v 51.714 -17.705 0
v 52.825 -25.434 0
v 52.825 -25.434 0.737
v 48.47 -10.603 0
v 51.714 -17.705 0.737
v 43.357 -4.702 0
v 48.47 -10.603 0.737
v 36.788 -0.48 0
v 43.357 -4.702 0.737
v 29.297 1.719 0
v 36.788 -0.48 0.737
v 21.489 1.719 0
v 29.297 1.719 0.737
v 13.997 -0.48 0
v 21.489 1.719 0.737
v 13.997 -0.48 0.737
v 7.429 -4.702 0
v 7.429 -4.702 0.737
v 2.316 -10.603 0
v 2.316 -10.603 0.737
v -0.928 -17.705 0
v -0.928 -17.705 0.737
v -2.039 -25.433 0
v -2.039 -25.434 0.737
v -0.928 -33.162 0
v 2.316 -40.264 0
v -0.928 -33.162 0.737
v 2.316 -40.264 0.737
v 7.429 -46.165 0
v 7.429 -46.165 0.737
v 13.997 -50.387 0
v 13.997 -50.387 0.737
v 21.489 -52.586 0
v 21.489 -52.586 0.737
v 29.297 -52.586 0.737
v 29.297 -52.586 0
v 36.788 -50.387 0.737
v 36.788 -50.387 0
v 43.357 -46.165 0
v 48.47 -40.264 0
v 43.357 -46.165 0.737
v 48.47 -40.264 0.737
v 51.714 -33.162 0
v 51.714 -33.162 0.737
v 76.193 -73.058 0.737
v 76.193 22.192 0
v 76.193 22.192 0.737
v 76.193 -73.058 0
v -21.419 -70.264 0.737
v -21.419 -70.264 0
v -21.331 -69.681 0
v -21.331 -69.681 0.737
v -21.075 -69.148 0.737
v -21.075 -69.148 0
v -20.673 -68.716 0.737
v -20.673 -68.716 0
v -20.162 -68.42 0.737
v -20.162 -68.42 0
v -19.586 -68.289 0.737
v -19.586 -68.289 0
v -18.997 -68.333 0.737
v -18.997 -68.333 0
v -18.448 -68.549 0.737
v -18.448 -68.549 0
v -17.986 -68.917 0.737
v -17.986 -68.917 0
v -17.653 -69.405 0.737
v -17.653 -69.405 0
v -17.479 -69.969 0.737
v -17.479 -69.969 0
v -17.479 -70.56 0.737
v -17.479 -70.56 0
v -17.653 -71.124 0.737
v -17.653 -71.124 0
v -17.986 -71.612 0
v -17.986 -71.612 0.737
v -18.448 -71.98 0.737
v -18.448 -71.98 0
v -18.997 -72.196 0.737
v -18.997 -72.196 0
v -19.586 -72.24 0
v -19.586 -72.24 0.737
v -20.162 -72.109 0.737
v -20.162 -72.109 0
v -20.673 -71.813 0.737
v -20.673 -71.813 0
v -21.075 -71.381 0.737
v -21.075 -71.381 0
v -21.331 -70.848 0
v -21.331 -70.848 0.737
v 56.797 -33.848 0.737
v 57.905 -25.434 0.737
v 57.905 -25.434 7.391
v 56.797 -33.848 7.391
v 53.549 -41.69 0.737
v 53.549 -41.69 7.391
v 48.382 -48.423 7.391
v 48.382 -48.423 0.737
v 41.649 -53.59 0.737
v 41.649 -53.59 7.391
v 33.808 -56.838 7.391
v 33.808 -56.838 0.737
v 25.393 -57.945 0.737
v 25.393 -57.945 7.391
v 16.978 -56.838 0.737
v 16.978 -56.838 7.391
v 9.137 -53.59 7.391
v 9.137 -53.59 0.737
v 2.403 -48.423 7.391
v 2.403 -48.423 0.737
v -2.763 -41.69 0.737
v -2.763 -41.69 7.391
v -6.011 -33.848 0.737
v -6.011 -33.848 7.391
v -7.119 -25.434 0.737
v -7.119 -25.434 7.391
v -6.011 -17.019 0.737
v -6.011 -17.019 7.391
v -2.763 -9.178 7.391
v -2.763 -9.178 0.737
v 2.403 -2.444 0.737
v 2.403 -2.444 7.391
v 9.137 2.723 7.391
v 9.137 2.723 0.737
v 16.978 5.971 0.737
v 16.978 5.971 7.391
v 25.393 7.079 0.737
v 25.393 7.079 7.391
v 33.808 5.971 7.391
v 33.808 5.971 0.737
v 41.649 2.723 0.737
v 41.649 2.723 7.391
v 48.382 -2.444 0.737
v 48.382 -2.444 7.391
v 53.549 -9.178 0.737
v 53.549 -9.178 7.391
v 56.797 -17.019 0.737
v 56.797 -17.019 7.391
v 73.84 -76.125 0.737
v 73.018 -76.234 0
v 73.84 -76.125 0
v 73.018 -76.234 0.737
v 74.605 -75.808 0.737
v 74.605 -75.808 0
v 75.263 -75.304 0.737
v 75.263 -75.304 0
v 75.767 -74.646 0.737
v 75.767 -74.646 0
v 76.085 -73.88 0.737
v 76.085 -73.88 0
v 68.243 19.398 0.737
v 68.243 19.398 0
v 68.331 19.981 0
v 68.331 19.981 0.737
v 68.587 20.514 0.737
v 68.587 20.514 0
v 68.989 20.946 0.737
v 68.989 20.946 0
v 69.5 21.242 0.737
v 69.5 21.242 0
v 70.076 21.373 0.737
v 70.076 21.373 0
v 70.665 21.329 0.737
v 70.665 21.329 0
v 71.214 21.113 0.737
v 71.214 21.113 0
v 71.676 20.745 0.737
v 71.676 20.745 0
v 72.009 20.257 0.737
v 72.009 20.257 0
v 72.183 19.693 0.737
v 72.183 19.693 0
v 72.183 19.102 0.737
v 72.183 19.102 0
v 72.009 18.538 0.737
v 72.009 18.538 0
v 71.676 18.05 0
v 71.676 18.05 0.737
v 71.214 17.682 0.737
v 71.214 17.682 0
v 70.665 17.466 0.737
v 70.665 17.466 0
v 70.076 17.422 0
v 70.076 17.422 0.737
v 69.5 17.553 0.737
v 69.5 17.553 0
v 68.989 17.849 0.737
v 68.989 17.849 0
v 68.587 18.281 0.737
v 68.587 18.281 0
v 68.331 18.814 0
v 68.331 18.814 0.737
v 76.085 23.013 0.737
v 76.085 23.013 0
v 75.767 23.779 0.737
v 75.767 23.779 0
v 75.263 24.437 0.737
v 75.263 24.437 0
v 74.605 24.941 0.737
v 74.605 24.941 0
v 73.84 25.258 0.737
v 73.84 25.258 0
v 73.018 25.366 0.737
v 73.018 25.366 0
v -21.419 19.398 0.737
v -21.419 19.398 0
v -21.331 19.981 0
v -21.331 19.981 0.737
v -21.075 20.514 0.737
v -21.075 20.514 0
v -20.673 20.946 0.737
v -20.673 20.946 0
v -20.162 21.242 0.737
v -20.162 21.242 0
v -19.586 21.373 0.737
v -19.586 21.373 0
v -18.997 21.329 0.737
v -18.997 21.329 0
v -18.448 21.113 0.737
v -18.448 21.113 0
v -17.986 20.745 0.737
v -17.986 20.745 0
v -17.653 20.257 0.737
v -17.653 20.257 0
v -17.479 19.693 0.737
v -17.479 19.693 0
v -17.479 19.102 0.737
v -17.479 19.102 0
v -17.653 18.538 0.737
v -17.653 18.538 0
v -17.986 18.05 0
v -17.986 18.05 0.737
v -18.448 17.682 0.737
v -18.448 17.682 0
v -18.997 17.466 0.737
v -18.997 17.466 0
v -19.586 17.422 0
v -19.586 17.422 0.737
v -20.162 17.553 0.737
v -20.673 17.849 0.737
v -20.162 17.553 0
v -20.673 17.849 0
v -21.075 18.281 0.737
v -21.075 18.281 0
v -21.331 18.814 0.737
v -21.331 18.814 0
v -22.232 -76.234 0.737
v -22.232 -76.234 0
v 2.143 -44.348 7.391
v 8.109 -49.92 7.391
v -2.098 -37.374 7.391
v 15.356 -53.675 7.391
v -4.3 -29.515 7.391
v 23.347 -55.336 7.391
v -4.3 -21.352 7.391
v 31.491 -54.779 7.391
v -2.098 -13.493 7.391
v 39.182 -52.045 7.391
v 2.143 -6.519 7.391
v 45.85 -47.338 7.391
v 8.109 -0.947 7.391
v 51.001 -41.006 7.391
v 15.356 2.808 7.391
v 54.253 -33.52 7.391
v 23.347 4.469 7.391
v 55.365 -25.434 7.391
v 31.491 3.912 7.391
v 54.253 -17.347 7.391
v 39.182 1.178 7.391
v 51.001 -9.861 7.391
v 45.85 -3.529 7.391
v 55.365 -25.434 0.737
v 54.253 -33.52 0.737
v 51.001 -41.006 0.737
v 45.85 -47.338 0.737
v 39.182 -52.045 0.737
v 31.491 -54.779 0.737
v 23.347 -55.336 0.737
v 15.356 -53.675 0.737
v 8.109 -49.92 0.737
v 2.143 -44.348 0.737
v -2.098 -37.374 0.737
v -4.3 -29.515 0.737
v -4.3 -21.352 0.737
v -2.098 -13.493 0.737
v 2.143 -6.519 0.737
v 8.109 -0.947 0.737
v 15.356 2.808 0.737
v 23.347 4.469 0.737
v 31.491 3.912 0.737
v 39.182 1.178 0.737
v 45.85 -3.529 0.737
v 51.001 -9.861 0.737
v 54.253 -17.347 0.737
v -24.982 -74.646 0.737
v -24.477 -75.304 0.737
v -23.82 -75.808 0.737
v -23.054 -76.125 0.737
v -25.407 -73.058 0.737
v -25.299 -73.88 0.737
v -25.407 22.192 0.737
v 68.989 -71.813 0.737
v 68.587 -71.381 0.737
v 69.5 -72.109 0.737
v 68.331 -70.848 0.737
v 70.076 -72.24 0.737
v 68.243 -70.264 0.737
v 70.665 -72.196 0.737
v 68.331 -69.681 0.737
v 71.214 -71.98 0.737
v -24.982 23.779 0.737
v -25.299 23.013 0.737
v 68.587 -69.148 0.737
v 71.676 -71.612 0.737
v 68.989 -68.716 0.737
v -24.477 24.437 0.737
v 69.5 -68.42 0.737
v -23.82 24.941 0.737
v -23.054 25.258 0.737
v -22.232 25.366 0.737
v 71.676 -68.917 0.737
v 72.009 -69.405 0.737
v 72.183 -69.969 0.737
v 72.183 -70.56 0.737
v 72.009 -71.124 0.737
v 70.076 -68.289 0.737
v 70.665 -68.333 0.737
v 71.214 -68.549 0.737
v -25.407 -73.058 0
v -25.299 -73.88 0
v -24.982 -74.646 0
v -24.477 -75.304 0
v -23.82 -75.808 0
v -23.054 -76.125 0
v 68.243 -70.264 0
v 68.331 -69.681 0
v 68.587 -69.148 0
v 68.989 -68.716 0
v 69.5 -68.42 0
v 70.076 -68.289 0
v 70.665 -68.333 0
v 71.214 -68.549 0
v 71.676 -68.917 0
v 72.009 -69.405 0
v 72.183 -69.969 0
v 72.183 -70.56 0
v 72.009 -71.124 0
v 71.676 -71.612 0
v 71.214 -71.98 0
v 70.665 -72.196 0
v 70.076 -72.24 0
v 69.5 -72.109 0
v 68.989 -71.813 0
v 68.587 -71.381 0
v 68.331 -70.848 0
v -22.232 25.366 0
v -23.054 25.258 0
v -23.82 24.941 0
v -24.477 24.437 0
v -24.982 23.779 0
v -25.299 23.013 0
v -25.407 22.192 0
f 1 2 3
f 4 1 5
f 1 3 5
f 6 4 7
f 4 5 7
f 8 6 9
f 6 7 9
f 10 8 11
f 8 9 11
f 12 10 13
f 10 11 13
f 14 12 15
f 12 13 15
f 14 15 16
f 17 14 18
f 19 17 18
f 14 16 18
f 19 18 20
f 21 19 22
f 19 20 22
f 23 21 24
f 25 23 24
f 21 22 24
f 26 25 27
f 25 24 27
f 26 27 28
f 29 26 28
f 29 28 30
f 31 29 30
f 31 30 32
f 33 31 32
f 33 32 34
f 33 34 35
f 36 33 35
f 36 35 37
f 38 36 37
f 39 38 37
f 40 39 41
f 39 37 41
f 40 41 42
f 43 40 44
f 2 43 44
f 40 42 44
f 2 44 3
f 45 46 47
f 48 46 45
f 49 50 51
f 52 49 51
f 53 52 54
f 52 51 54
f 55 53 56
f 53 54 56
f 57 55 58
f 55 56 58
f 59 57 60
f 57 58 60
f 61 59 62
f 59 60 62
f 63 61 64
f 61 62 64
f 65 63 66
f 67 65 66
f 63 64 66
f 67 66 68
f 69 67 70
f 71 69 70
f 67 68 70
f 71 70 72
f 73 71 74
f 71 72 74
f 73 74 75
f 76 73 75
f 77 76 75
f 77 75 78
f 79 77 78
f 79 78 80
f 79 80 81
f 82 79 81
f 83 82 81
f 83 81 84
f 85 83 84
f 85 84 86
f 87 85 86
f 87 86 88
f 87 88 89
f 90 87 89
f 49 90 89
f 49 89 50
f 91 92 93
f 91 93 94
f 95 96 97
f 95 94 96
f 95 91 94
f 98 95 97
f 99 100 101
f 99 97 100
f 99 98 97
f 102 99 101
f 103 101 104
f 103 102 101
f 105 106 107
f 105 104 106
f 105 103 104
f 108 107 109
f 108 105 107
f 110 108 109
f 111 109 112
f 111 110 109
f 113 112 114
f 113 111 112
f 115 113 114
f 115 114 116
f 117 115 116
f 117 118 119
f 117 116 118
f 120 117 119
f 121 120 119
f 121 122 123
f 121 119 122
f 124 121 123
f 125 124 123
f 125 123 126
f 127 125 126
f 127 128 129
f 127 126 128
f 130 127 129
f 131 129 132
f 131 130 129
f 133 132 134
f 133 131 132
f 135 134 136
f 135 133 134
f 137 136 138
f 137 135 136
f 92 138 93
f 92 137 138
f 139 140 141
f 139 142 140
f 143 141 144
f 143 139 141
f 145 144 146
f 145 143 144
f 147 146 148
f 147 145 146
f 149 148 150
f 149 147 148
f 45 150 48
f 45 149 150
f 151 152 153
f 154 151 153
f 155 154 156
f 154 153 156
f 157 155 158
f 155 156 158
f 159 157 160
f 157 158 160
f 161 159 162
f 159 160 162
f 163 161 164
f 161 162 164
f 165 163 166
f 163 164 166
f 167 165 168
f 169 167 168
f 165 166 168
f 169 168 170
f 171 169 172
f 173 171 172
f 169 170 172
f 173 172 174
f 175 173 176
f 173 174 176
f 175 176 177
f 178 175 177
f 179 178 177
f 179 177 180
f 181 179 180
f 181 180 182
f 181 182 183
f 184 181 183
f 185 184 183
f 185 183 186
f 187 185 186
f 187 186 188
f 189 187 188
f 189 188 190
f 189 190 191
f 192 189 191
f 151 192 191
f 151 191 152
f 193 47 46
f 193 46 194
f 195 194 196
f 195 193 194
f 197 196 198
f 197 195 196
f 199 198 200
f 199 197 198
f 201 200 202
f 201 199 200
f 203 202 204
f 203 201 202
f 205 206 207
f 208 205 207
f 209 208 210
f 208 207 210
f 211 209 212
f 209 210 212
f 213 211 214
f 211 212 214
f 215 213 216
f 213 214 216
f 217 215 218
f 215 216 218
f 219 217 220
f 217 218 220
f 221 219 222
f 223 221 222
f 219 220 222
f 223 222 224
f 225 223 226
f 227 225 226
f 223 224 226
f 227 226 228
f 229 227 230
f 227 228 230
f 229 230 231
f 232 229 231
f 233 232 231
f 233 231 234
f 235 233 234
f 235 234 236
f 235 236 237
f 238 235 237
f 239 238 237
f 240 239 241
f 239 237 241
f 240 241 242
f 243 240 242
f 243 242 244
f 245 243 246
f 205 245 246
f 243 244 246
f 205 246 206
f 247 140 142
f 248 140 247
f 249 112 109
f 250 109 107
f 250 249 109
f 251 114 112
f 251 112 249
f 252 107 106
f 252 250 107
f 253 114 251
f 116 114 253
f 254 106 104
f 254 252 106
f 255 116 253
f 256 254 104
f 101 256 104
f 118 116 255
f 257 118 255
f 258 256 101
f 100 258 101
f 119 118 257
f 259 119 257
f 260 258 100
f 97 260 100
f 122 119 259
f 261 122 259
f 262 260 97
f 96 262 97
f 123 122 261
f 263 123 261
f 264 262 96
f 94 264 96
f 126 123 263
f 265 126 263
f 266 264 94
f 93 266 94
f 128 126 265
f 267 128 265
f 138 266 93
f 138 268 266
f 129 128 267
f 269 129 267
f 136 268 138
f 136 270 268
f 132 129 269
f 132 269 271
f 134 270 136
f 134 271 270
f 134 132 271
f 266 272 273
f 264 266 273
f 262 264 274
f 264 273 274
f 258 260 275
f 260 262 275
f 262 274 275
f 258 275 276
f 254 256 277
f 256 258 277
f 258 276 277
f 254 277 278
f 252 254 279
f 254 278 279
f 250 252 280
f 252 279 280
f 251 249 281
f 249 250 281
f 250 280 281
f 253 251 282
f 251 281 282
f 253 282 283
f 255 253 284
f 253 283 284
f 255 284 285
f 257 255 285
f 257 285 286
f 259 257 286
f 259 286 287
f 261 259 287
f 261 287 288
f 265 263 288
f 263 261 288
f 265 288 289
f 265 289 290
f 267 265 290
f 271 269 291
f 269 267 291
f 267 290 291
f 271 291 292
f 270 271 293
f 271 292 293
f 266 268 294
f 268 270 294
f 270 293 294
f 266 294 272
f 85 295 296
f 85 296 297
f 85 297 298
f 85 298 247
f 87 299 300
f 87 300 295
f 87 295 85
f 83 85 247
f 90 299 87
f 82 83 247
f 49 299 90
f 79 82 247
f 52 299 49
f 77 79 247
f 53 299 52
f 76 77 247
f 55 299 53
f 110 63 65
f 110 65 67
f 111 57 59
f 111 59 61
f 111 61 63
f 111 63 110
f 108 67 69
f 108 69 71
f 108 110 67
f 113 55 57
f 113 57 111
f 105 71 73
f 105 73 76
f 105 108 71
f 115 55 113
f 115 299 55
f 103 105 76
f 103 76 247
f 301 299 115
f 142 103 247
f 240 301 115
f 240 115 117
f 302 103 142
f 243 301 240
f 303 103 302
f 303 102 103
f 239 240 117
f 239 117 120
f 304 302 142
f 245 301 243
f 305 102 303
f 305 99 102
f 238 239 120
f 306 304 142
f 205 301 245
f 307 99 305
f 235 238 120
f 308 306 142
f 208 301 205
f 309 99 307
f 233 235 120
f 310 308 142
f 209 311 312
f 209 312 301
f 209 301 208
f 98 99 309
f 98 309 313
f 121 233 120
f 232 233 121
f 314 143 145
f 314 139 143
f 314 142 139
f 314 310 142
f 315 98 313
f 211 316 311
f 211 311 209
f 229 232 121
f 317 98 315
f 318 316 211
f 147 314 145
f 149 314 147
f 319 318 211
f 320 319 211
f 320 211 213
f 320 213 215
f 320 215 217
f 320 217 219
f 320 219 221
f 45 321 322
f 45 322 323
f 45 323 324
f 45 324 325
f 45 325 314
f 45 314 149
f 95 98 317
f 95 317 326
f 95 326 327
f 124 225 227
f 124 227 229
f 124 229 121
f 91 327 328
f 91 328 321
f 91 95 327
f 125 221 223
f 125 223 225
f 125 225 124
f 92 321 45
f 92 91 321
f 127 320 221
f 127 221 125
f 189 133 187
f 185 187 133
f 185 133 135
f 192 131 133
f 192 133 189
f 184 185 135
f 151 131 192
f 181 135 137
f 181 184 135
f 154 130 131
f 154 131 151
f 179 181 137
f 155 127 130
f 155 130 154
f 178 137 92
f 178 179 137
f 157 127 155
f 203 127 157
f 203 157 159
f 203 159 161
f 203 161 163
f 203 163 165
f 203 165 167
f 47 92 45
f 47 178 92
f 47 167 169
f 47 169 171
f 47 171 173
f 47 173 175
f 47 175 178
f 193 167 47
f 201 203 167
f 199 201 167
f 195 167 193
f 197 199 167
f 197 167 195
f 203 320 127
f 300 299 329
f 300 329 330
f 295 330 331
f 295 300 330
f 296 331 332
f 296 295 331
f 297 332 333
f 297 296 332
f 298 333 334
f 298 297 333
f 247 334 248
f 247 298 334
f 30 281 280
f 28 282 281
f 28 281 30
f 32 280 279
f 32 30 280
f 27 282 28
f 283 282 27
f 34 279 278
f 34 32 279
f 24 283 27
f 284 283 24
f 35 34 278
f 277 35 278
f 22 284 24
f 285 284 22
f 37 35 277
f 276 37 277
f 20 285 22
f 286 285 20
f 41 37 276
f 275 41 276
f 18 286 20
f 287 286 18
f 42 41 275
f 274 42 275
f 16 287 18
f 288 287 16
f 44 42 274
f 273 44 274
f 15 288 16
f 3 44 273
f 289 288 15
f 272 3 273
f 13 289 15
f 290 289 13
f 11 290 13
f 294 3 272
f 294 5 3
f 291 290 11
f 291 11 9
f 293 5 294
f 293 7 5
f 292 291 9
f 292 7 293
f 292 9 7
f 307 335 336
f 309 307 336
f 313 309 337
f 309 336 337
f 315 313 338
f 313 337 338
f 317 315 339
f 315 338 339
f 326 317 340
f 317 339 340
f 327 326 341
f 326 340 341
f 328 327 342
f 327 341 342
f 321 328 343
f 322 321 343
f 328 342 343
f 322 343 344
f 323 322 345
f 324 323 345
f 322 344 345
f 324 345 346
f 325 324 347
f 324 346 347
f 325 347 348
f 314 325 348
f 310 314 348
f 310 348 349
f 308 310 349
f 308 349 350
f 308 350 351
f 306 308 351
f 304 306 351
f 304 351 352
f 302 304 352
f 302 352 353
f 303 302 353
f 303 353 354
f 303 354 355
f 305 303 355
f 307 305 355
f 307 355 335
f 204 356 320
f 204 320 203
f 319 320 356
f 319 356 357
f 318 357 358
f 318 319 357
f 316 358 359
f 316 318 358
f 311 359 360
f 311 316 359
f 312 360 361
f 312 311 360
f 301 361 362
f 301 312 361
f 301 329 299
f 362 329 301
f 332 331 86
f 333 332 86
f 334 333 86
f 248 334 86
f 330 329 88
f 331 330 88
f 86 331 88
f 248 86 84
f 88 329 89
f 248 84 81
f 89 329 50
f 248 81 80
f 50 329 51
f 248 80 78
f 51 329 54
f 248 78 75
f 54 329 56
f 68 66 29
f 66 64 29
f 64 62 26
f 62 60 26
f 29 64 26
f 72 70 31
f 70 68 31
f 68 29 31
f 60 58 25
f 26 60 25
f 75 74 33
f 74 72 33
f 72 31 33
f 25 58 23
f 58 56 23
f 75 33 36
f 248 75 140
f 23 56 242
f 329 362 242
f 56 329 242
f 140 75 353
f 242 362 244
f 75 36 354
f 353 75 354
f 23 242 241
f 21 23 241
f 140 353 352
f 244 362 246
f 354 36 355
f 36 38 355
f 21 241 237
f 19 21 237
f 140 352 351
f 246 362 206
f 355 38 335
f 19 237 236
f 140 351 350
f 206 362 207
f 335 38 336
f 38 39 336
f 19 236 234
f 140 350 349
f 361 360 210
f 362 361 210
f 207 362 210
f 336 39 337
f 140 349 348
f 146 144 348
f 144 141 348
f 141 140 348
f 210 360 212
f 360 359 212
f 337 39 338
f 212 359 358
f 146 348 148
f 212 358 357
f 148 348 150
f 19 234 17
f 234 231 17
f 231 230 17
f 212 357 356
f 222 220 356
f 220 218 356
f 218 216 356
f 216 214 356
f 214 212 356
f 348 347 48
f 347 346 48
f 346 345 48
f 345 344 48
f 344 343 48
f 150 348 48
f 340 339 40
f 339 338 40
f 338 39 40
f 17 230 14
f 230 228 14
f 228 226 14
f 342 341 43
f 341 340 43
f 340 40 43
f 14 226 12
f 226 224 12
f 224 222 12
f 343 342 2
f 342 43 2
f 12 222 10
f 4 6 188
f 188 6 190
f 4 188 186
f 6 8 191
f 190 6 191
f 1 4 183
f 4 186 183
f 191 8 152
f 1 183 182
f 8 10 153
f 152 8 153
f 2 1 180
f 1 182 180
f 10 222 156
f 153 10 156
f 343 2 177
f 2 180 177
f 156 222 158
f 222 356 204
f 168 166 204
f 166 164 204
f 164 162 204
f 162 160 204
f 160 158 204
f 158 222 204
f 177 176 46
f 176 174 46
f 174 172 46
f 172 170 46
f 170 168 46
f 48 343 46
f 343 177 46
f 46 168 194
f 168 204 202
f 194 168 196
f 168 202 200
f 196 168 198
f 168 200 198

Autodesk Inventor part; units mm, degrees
ref_plane "YZ Plane" through (0, 0, 0) normal (1, 0, 0) x (0, 1, 0)
ref_plane "XZ Plane" through (0, 0, 0) normal (0, 1, 0) x (-1, 0, 0)
ref_plane "XY Plane" through (0, 0, 0) normal (0, 0, 1) x (1, 0, 0)
sketch "Sketch1" plane through (0, 0, 0) normal (0, 0, 1) x (1, 0, 0)
  line L0 (-25.4072, 25.3665) -> (76.1928, 25.3665)
  line L1 (76.1928, 25.3665) -> (76.1928, -76.2335)
  line L2 (76.1928, -76.2335) -> (-25.4072, -76.2335)
  line L3 (-25.4072, -76.2335) -> (-25.4072, 25.3665)
  point P0 (0, 0)
  dimension "d0" = 101.6
  dimension "d1" = 101.6
extrude "Extrusion1" add sketch "Sketch1" along normal blind 0.7366
sketch "Sketch2" plane through (0, 0, 0.7366) normal (0, 0, 1) x (1, 0, 0)
  line L0 (-25.4072, 25.3665) -> (76.1928, -76.2335)
  line L1 (76.1928, 25.3665) -> (-25.4072, -76.2335)
  circle A0 centre (25.3928, -25.4335) radius 27.432
  point P0 (0, 0)
  dimension "d4" = 54.864
extrude "Extrusion2" cut sketch "Sketch2" against normal blind 0.7366
sketch "Sketch3" plane through (0, 0, 0.7366) normal (0, 0, 1) x (1, 0, 0)
  line L0 (-25.4072, -76.2335) -> (-25.4072, 25.3665) projected
  line L1 (-25.4072, 25.3665) -> (-25.4072, -25.4335)
  line L2 (-25.4072, -25.4335) -> (-25.4072, 19.4102)
  line L3 (-25.4072, 25.3665) -> (76.1928, -76.2335)
  line L4 (76.1928, 25.3665) -> (-25.4072, -76.2335)
  circle A0 centre (-19.4509, 19.4102) radius 1.9812
  point P0 (0, 0)
  dimension "d7" = 44.8437
  dimension "d8" = 3.9624
extrude "Extrusion3" cut sketch "Sketch3" against normal blind 0.7366 contours A0 L3 | L3 A0
sketch "Sketch4" plane through (0, 0, 0.7366) normal (0, 0, 1) x (1, 0, 0)
  line L0 (-25.4072, -76.2335) -> (76.1928, 25.3665)
  line L1 (-25.4072, 25.3665) -> (76.1928, -76.2335)
  circle A0 centre (70.2365, 19.4102) radius 1.9819
  circle A1 centre (70.2365, -70.2772) radius 1.983
  circle A2 centre (-19.4509, -70.2772) radius 1.9812
  point P0 (0, 0)
extrude "Extrusion4" cut sketch "Sketch4" against normal blind 0.7366
sketch "Sketch5" plane through (0, 0, 0.7366) normal (0, 0, 1) x (1, 0, 0)
  circle A0 centre (25.3928, -25.4335) radius 27.432 projected
  circle A1 centre (25.3928, -25.4335) radius 29.972
  circle A2 centre (25.3928, -25.4335) radius 32.512
  point P0 (0, 0)
  dimension "d13" = 59.944
  dimension "d14" = 65.024
extrude "Extrusion5" add sketch "Sketch5" along normal blind 6.6548 contours A2
fillet "Fillet1" radius 3.175 4 edges at (-25.4072, 25.3665, 0.3683) (76.1928, 25.3665, 0.3683) (76.1928, -76.2335, 0.3683) (-25.4072, -76.2335, 0.3683)
sketch "Sketch6" plane through (0, 0, 0) normal (0, 0, -1) x (-1, 0, 0)
  circle A0 centre (-70.2365, 19.4102) radius 1.9819 projected
  circle A1 centre (19.4509, -70.2772) radius 1.9812 projected
  circle A2 centre (-70.2365, -70.2772) radius 1.983 projected
  circle A3 centre (19.4509, 19.4102) radius 1.9812 projected
  point P0 (0, 0)
extrude "Extrusion6" add sketch "Sketch6" against normal blind 0.7366
sketch "Sketch7" plane through (0, 0, 0) normal (0, 0, -1) x (-1, 0, 0)
  line L0 (-76.1928, 25.3665) -> (-70.2238, 25.3665)
  line L1 (-70.2238, 25.3665) -> (-70.2238, 19.3975)
  line L2 (-70.2238, 19.3975) -> (-76.1928, 19.3975)
  line L3 (-76.1928, 19.3975) -> (-76.1928, 25.3665)
  line L4 (-76.1928, -76.2335) -> (-70.2238, -76.2335)
  line L5 (-70.2238, -76.2335) -> (-70.2238, -70.2645)
  line L6 (-70.2238, -70.2645) -> (-76.1928, -70.2645)
  line L7 (-76.1928, -70.2645) -> (-76.1928, -76.2335)
  line L8 (25.4072, 25.3665) -> (19.4382, 25.3665)
  line L9 (19.4382, 25.3665) -> (19.4382, 19.3975)
  line L10 (19.4382, 19.3975) -> (25.4072, 19.3975)
  line L11 (25.4072, 19.3975) -> (25.4072, 25.3665)
  line L12 (25.4072, -76.2335) -> (19.4382, -76.2335)
  line L13 (19.4382, -76.2335) -> (19.4382, -70.2645)
  line L14 (19.4382, -70.2645) -> (25.4072, -70.2645)
  line L15 (25.4072, -70.2645) -> (25.4072, -76.2335)
  circle A0 centre (-70.2238, -70.2645) radius 1.9812
  circle A1 centre (-70.2238, 19.3975) radius 1.9812
  circle A2 centre (19.4382, 19.3975) radius 1.9812
  circle A3 centre (19.4382, -70.2645) radius 1.9812
  point P0 (0, 0)
  dimension "d20" = 5.969
  dimension "d21" = 5.969
  dimension "d22" = 5.969
  dimension "d23" = 5.969
  dimension "d24" = 5.969
  dimension "d25" = 3.9624
extrude "Extrusion7" cut sketch "Sketch7" against normal blind 0.7366 contours A1 L2 L1 | L1 L2 A1 | A0 L6 L5 | L5 L6 A0 | A2 L10 L9 | L9 L10 A2 | A3 L14 L13 | L13 L14 A3
properties part number "1"
